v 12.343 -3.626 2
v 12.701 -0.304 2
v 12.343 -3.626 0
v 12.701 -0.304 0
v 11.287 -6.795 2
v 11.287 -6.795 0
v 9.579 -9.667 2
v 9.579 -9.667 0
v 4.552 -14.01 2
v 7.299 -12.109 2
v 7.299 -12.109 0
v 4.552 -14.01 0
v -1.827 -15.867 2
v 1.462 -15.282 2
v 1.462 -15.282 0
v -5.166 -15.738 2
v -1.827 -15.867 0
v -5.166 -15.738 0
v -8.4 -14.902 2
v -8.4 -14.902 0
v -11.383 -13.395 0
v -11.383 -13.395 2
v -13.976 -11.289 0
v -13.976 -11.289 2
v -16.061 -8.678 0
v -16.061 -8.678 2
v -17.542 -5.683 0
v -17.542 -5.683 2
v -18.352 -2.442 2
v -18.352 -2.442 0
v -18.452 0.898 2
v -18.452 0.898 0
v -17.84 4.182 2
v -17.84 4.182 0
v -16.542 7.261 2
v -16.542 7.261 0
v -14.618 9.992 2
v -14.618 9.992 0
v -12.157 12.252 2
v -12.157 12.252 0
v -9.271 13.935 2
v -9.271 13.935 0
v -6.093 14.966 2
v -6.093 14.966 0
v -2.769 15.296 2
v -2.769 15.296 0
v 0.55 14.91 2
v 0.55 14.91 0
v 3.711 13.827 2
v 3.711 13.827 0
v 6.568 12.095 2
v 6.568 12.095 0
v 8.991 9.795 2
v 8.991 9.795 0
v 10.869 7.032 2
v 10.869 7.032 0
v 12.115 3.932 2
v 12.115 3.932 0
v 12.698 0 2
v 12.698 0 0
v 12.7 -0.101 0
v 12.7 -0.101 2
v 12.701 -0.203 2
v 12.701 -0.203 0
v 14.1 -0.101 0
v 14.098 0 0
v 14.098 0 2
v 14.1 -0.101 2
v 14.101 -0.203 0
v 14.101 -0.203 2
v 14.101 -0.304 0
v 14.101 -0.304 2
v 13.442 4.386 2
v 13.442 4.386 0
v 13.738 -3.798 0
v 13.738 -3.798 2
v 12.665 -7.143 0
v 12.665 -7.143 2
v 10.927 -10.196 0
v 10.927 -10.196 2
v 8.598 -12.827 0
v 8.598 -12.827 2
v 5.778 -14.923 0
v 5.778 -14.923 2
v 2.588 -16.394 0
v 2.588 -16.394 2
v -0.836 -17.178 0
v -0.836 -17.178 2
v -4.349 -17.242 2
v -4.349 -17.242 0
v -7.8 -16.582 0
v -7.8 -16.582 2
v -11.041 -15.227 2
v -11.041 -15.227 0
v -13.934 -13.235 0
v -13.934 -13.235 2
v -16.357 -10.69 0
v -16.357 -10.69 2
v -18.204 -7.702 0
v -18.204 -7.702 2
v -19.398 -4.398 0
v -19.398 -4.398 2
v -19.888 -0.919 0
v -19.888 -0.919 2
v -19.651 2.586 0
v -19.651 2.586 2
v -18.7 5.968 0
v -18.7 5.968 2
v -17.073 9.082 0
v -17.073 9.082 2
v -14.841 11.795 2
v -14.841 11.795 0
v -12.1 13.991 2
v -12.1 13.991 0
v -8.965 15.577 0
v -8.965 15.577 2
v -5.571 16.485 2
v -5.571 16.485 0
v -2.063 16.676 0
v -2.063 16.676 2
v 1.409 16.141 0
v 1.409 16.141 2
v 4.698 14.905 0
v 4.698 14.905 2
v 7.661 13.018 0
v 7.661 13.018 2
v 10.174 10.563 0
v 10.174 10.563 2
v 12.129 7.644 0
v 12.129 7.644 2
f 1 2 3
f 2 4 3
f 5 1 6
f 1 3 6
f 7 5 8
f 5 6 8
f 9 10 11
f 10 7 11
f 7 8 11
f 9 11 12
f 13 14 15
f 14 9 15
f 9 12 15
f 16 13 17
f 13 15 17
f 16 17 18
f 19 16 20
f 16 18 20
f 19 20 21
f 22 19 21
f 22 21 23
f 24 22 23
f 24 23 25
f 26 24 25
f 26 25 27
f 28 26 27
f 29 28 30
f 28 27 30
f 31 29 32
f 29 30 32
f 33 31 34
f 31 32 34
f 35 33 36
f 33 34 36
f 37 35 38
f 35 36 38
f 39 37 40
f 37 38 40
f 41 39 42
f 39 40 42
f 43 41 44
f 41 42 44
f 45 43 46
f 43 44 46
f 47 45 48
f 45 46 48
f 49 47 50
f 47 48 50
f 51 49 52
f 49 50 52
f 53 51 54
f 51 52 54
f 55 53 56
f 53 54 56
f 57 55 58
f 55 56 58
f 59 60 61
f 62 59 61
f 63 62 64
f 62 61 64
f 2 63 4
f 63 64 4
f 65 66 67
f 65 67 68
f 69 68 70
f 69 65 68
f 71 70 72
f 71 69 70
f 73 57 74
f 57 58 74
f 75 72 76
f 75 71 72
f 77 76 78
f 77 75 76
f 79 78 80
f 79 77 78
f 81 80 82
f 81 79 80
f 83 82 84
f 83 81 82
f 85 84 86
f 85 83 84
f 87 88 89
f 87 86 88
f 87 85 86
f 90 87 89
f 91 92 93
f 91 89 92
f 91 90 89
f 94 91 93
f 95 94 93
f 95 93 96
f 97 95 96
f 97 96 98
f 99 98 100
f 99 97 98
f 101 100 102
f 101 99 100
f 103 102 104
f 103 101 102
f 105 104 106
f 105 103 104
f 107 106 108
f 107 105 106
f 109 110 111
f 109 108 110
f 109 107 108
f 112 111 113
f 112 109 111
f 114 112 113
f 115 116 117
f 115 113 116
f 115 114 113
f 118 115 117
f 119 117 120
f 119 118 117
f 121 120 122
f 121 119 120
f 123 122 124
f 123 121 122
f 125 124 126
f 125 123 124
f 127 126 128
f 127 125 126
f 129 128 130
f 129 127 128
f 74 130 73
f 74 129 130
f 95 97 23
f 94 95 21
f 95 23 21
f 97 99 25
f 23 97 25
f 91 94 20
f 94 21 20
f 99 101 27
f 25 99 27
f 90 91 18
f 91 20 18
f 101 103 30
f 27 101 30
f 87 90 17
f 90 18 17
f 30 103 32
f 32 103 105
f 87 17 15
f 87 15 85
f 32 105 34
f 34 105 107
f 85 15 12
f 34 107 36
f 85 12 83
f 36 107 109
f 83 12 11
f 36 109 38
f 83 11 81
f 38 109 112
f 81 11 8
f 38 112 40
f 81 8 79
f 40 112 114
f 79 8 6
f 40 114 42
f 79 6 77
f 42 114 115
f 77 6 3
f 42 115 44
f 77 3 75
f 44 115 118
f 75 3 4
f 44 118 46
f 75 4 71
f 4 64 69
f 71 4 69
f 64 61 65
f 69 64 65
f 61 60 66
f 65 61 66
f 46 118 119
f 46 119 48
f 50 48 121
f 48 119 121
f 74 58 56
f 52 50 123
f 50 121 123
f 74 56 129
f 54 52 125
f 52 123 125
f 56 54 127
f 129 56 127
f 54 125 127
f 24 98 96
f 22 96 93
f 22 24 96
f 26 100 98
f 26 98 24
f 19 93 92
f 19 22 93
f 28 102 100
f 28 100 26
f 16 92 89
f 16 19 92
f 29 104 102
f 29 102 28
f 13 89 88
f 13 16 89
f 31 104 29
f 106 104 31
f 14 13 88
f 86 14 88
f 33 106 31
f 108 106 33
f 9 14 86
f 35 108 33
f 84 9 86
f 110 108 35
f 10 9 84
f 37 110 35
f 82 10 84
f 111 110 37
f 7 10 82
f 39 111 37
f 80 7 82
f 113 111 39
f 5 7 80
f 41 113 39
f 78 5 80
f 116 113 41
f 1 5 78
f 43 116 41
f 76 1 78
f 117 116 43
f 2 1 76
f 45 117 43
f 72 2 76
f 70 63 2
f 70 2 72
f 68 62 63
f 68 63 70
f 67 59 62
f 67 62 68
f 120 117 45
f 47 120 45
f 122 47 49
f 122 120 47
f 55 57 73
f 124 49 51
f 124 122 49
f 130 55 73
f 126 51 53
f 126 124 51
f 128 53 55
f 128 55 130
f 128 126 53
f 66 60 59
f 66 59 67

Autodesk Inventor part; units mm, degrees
ref_plane "YZ Plane" through (0, 0, 0) normal (1, 0, 0) x (0, 1, 0)
ref_plane "XZ Plane" through (0, 0, 0) normal (0, 1, 0) x (-1, 0, 0)
ref_plane "XY Plane" through (0, 0, 0) normal (0, 0, 1) x (1, 0, 0)
ref_plane "Work Plane1" through (0, 0, 0) normal (0, 0, 1) x (1, 0, 0)
sketch "Sketch1" plane through (0, 0, 0) normal (0, 0, 1) x (1, 0, 0)
  circle A0 centre (-2.8988, -0.3038) radius 16.3 construction
  circle A1 centre (-2.8988, -0.3038) radius 15.6
  circle A2 centre (-2.8988, -0.3038) radius 17
  line L0 (12.6983, 0) -> (14.0985, 0)
  line L1 (12.1151, 3.932) -> (13.4417, 4.3855)
  point P0 (0, 0)
  dimension "d0" = 0.7
  dimension "d1" = 0.7
  dimension "d4" = 34
extrude "Extrusion1" add sketch "Sketch1" along normal blind 2 contours A1 L0 A2 L1 picked at (13.4719, -1.6516)
properties part number "11_Lens_Thorlabs_Mount_Ring_B"
